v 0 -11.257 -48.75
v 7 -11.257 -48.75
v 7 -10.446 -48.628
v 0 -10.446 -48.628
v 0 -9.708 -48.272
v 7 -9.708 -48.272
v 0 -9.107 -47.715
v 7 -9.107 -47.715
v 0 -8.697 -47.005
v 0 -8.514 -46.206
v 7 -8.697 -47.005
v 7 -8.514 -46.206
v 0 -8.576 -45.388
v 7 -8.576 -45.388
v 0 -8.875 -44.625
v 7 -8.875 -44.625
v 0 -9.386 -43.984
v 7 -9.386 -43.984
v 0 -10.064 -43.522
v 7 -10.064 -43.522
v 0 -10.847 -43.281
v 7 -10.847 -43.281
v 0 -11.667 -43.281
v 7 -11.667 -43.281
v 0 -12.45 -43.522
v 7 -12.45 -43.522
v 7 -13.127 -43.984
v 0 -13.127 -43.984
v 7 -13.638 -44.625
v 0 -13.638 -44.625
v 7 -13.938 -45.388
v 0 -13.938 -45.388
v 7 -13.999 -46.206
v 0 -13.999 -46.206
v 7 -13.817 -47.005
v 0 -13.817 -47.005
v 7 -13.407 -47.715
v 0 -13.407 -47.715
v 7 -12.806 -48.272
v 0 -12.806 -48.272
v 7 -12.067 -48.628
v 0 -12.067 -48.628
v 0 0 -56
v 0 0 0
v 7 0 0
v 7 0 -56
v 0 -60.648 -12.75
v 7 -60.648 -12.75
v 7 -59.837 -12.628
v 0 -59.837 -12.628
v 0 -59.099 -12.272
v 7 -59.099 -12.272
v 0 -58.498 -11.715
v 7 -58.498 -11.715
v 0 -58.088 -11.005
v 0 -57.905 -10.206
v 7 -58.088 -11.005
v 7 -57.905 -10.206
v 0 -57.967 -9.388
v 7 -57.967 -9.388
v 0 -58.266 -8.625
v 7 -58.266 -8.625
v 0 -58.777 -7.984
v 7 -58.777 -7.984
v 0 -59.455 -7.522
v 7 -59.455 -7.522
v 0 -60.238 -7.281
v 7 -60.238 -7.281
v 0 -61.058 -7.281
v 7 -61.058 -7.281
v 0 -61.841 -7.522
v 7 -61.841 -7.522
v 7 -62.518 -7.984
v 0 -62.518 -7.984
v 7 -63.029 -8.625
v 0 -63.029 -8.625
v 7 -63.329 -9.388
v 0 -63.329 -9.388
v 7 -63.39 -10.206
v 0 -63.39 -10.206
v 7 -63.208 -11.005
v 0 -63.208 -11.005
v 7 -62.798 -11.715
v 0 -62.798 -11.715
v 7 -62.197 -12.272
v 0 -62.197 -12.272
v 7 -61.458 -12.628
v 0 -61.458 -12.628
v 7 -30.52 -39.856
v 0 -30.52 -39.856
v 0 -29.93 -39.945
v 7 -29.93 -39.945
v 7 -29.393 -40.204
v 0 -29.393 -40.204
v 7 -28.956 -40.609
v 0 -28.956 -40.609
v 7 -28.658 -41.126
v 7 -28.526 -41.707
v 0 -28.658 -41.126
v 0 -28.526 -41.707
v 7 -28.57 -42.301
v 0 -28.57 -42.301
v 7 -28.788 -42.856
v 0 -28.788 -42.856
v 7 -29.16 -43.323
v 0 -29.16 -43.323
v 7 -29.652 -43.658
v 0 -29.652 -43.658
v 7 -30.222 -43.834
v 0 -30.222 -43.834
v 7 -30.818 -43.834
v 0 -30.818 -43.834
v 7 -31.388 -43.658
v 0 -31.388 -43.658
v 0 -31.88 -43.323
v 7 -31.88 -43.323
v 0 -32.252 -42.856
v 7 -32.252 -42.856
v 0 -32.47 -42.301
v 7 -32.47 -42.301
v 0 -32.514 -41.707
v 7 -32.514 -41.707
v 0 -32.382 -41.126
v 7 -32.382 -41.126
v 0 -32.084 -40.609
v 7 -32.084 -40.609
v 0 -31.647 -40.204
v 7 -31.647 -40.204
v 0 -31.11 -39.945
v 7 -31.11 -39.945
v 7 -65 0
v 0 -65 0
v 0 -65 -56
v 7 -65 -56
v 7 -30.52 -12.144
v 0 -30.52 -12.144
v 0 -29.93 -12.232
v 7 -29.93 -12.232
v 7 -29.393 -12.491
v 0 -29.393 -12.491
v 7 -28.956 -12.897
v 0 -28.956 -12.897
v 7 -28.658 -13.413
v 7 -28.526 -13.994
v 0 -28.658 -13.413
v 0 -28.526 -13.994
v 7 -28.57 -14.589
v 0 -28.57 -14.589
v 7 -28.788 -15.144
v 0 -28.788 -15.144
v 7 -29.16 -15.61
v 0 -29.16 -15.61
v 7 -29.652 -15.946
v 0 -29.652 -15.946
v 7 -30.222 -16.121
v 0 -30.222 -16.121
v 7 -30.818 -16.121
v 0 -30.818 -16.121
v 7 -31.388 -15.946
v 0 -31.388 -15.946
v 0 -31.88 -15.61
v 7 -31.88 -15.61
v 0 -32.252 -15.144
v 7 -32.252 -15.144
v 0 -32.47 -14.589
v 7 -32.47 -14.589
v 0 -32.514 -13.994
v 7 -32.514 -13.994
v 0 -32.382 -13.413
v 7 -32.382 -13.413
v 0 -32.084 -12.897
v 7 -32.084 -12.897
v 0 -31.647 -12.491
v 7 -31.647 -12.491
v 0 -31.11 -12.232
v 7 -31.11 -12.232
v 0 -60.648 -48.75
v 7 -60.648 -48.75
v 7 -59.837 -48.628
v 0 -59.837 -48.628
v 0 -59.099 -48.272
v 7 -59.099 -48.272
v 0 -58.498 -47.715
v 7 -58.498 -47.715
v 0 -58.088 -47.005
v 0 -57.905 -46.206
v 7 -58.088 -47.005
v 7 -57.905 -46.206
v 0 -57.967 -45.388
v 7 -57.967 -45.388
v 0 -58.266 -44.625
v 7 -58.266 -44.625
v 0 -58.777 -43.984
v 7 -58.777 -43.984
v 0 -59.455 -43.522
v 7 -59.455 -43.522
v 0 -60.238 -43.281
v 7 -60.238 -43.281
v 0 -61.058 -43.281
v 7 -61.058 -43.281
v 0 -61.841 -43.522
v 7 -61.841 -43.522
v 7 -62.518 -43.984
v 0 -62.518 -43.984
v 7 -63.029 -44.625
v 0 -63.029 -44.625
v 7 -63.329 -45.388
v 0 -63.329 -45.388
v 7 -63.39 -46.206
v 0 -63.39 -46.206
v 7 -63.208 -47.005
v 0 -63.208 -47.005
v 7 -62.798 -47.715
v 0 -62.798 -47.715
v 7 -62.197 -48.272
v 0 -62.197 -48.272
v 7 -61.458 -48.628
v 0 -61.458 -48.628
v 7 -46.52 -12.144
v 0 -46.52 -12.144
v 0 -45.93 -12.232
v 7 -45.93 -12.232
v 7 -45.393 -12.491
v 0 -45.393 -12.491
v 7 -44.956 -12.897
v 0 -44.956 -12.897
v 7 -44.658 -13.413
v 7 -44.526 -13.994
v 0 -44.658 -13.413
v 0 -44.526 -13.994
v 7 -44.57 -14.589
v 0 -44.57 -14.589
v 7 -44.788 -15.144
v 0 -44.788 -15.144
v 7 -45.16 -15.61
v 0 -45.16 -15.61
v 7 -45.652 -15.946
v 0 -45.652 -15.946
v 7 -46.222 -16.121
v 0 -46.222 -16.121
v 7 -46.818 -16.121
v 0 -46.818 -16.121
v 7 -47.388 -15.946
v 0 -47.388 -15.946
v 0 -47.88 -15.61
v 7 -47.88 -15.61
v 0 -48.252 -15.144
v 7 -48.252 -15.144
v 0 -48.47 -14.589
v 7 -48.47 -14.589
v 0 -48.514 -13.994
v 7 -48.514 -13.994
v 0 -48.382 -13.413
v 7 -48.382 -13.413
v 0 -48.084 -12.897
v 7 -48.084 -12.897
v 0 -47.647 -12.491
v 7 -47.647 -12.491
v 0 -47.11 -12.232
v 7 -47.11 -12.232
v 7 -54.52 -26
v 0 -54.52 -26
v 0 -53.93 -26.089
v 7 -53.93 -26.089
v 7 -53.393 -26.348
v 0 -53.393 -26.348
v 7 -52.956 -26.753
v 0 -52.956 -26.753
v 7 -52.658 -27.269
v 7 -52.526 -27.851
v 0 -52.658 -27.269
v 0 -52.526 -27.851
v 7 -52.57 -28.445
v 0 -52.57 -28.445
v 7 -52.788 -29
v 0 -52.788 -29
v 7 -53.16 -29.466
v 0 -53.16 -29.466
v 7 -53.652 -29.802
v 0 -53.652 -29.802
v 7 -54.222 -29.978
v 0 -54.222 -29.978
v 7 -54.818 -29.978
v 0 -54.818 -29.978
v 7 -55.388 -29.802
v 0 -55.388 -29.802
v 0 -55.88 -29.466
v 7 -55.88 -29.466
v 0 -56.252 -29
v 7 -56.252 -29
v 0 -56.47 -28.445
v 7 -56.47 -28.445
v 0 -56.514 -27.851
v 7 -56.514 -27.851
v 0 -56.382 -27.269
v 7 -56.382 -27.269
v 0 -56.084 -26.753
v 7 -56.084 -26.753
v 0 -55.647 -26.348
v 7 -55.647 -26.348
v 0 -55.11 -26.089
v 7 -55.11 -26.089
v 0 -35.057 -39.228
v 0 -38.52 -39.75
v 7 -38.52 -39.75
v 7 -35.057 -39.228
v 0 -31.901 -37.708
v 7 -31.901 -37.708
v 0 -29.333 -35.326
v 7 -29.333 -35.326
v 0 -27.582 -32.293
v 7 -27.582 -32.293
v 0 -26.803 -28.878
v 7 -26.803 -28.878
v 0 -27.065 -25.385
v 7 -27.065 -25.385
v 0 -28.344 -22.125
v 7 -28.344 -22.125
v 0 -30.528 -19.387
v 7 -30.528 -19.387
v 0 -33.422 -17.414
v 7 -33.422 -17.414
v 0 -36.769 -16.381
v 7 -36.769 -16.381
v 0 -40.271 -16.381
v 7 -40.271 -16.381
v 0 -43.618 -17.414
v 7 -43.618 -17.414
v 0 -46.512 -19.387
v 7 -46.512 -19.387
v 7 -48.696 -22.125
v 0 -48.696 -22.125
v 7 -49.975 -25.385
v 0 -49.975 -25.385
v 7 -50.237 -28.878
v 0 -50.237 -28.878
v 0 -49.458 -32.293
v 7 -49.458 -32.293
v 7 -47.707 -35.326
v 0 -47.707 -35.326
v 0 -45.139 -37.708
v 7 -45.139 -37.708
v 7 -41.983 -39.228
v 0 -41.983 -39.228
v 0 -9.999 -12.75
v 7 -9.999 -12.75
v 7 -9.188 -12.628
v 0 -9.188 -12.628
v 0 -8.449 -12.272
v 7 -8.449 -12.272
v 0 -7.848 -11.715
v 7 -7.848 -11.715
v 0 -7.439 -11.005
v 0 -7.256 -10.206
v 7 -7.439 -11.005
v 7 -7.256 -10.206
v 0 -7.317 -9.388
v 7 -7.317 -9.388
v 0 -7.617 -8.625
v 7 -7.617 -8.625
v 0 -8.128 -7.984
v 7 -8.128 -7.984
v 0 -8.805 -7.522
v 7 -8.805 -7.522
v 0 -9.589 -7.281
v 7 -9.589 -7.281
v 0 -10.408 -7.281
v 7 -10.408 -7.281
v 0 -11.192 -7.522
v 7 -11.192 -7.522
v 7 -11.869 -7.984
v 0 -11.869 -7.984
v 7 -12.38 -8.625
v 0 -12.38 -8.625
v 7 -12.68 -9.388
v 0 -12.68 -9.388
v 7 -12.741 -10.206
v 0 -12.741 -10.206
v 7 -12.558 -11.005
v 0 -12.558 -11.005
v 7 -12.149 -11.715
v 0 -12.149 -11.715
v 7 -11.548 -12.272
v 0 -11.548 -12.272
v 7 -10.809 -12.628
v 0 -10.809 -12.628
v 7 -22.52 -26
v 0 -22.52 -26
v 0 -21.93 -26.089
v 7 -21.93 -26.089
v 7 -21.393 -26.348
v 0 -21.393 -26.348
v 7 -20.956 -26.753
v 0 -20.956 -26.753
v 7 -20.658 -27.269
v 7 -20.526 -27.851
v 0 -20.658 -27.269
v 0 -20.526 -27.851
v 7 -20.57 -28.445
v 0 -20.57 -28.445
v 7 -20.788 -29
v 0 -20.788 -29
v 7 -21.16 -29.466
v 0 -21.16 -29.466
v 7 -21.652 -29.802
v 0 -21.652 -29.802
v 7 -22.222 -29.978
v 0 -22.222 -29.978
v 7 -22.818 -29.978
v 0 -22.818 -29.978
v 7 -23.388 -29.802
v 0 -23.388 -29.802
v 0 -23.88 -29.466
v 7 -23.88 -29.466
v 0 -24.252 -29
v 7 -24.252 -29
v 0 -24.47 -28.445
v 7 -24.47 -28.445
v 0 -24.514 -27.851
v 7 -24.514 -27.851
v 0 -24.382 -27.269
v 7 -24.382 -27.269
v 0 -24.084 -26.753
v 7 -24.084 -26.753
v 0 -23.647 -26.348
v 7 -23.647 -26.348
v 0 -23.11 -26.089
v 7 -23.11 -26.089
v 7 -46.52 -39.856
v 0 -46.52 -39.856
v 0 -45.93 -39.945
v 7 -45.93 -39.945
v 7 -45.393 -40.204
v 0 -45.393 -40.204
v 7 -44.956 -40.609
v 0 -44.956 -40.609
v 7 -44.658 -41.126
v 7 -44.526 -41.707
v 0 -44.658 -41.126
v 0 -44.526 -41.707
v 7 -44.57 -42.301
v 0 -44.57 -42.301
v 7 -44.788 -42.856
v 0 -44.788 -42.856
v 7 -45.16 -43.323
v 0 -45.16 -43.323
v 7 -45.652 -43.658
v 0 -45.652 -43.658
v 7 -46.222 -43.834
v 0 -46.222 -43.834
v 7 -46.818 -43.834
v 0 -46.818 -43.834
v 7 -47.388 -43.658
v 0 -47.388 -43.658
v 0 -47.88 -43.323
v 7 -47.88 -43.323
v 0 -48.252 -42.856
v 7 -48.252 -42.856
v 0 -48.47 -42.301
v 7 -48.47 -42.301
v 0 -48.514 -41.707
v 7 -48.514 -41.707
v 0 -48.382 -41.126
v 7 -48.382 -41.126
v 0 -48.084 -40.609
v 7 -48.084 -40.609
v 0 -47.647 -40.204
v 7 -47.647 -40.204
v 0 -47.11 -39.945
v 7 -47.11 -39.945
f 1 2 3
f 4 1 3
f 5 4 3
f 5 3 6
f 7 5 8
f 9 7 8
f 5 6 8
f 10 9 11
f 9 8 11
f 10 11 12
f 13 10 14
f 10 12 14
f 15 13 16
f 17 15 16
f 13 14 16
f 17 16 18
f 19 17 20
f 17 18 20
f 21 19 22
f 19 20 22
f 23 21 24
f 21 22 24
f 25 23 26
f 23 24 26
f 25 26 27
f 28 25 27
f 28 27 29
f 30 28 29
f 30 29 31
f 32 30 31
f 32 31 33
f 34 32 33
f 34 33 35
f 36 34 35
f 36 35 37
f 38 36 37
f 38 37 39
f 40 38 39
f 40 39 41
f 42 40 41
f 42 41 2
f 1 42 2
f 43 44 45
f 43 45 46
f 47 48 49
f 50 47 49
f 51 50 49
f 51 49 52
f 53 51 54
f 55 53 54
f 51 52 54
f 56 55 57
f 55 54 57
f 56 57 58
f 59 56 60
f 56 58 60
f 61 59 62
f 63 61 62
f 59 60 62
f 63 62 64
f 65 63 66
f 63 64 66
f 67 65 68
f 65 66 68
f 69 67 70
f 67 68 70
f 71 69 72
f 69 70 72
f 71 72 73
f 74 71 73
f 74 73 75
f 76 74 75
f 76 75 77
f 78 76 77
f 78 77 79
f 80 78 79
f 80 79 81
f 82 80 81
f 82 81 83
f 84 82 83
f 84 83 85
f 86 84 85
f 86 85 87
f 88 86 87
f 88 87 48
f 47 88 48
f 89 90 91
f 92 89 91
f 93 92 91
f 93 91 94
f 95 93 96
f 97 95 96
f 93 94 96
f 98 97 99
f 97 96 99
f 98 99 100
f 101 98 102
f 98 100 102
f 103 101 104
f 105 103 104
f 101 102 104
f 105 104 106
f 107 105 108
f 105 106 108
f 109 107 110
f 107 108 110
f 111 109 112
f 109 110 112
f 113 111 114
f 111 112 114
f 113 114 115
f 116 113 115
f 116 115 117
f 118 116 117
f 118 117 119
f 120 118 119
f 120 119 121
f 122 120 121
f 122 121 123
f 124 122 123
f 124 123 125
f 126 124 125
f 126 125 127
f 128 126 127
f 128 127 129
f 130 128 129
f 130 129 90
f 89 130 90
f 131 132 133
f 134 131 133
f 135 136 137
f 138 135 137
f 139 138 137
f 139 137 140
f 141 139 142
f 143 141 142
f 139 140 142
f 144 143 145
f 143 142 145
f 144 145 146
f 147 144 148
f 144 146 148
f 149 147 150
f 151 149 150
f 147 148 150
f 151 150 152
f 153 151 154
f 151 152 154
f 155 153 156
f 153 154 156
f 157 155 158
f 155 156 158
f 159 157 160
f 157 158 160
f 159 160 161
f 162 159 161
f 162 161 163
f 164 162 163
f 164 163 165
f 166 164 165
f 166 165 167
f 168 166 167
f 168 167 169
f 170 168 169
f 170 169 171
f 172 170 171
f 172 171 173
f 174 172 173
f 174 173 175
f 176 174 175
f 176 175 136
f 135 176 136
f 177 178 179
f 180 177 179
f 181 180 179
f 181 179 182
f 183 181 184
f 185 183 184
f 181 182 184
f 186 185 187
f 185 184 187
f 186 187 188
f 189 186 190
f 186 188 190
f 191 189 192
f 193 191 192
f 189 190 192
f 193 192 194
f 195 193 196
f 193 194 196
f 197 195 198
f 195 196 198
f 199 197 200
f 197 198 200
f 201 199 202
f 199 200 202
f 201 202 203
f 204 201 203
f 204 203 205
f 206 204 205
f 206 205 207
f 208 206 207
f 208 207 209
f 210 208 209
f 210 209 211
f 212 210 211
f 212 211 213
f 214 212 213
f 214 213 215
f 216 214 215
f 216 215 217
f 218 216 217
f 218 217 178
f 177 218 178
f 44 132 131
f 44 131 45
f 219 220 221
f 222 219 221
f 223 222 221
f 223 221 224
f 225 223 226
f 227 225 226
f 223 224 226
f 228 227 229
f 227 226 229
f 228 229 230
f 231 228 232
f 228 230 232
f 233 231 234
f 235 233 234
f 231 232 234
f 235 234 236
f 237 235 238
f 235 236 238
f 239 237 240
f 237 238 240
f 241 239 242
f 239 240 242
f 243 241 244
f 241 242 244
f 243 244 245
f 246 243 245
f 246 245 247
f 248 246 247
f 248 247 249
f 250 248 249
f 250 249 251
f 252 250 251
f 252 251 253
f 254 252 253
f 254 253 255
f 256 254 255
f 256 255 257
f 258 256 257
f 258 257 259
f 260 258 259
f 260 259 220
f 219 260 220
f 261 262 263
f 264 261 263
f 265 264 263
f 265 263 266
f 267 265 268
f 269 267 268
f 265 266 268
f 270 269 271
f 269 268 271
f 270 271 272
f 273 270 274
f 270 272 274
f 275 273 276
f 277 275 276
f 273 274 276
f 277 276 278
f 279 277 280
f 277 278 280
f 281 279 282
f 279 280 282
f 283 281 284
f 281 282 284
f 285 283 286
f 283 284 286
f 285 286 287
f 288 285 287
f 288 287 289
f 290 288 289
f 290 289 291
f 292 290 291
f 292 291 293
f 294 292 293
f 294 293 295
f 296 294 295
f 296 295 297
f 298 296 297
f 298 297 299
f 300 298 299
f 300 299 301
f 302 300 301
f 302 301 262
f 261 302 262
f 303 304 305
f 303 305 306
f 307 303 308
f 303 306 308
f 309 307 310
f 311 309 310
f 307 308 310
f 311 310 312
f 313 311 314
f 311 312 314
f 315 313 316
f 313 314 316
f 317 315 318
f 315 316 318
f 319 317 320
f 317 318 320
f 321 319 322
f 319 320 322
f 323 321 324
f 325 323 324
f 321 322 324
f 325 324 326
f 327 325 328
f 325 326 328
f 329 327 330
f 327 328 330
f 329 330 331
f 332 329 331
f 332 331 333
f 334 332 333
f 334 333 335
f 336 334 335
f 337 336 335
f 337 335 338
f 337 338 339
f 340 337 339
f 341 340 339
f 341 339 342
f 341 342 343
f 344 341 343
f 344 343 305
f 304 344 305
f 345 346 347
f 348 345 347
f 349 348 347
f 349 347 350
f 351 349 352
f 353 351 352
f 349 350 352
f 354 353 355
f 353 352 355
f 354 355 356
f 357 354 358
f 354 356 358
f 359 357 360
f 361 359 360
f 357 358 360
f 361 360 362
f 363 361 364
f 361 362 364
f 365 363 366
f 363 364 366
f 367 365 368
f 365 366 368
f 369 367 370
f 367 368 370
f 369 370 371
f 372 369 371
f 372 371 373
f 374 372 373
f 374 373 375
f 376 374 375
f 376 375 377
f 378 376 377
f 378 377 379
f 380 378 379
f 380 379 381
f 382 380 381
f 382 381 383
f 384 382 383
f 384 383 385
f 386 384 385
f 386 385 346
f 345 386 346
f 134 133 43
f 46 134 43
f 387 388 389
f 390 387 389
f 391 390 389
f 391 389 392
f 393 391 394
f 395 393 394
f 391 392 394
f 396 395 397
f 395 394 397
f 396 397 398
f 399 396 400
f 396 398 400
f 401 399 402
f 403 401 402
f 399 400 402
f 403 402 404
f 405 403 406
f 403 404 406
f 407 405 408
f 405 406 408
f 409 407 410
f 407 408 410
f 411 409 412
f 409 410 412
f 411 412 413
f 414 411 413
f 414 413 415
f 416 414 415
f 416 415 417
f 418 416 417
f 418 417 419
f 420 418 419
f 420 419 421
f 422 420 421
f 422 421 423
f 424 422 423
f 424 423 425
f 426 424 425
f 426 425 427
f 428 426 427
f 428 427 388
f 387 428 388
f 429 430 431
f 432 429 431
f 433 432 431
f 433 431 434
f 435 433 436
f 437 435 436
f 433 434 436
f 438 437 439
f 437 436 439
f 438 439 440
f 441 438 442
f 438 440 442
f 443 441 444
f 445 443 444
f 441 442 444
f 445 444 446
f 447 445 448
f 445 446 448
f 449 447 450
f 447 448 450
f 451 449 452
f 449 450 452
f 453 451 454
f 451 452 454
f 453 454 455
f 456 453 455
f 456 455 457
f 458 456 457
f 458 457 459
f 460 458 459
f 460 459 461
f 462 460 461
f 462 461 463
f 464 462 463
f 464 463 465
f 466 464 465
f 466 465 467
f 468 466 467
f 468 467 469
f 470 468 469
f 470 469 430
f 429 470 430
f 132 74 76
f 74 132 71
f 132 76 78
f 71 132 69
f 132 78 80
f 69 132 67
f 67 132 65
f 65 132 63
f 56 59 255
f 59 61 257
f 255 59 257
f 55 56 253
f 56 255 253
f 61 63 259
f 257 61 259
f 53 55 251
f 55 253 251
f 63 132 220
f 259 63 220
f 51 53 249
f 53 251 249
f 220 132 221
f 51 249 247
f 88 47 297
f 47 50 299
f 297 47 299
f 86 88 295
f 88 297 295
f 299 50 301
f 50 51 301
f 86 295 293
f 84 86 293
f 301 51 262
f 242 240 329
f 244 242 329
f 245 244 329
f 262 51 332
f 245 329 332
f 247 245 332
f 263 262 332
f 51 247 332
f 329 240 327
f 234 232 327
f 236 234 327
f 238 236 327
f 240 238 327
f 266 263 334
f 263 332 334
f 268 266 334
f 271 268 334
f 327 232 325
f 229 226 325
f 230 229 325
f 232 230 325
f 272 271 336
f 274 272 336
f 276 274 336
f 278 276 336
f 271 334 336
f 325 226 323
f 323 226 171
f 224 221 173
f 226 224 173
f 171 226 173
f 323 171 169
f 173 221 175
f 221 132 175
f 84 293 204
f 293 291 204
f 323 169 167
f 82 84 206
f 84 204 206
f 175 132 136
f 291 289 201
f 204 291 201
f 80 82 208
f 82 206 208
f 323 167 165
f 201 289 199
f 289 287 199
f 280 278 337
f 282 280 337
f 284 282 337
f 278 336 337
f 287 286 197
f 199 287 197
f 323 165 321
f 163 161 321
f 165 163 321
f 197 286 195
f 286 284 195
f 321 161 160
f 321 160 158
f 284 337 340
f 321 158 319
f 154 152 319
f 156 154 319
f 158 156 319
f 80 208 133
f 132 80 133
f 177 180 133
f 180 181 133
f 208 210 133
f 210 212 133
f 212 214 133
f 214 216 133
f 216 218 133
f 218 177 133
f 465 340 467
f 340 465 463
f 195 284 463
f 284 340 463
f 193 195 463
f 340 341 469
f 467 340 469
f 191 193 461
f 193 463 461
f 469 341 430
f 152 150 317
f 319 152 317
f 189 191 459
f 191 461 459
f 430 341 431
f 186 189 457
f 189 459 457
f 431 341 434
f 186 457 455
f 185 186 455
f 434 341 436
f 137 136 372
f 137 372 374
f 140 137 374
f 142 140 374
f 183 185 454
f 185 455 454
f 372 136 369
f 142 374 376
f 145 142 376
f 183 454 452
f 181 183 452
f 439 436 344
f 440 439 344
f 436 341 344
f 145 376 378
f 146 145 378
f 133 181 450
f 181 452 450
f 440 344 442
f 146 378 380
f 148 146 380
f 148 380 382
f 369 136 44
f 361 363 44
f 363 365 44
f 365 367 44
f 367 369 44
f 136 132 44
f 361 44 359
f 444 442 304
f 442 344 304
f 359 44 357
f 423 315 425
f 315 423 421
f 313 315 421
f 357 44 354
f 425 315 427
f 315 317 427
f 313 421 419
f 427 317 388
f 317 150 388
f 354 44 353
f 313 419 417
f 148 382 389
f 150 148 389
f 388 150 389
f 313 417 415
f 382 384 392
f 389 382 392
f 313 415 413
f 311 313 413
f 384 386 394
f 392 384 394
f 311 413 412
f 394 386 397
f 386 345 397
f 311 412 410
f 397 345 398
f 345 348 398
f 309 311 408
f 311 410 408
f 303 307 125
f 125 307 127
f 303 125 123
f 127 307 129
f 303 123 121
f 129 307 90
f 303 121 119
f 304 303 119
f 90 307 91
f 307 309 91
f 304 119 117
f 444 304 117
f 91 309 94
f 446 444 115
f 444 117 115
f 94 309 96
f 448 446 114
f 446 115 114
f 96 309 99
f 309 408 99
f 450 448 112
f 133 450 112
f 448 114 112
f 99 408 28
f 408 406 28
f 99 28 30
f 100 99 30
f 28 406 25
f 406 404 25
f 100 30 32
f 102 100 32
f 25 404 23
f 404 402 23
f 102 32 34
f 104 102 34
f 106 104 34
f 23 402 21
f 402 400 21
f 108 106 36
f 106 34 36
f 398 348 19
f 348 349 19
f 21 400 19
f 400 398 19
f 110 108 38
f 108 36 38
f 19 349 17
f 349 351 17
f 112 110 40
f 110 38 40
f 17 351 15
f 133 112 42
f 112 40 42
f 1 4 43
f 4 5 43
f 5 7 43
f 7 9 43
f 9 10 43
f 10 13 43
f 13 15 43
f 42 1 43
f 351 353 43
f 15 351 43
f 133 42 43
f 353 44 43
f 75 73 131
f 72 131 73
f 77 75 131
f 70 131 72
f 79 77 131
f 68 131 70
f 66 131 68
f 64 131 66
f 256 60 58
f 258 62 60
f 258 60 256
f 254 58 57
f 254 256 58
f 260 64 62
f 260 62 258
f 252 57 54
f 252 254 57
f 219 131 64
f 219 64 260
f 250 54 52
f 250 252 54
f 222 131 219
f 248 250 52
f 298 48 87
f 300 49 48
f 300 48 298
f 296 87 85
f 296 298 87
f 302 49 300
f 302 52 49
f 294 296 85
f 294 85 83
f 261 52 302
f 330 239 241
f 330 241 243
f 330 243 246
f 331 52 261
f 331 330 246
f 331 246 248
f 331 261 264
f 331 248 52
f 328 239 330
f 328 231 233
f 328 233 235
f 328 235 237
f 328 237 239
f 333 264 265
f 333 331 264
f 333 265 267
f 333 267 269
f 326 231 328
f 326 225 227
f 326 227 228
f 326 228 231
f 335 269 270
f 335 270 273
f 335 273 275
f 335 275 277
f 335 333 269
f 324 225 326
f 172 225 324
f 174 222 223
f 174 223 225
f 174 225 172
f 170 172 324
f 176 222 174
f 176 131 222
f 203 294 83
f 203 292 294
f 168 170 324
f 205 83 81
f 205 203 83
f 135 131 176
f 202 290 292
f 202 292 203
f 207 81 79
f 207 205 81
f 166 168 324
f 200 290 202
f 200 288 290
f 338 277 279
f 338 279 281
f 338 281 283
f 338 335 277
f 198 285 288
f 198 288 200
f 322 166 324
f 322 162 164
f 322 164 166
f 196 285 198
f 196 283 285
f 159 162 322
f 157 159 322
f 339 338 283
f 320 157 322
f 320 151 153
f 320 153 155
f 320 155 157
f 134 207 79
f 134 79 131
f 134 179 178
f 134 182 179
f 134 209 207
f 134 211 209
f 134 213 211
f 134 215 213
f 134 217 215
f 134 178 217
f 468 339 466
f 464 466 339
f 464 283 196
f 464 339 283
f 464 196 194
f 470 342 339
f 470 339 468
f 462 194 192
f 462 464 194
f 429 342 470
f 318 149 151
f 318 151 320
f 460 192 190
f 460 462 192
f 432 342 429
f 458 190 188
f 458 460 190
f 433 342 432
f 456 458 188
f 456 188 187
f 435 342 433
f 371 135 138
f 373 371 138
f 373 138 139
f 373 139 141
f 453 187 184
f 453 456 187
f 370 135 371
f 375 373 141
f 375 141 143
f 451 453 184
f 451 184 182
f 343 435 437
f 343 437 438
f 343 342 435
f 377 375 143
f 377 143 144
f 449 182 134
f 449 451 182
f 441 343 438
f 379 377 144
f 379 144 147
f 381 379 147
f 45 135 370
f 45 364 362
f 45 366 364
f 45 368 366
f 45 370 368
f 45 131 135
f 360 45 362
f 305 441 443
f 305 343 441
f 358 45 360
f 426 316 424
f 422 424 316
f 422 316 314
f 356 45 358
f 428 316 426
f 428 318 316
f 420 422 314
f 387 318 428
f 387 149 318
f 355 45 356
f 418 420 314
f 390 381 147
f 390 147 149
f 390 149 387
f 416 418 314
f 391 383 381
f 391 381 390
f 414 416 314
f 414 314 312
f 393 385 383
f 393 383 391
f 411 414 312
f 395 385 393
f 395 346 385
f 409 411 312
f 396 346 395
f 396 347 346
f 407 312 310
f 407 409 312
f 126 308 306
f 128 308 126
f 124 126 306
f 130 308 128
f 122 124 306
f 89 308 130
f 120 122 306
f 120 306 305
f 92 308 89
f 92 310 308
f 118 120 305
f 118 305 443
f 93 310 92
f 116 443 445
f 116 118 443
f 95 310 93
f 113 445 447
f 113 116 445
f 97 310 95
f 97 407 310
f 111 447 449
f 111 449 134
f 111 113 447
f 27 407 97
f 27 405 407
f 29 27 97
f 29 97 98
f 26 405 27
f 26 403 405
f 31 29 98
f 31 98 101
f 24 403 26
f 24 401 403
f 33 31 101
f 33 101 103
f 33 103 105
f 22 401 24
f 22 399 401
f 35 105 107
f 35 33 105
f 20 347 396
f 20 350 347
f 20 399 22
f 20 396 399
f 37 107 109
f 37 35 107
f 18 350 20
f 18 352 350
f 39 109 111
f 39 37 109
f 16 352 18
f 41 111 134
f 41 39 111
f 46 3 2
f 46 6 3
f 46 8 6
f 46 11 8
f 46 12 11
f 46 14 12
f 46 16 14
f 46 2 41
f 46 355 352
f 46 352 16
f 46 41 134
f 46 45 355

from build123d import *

# Parameters (mm, degrees)
SKETCH1_W           = 56
SKETCH1_H           = 65
BOSS_EXTRUDE1_DEPTH = 7
SKETCH2_R           = 11.75
CUT_EXTRUDE1_DEPTH  = 8
SKETCH3_R           = 2
CUT_EXTRUDE2_DEPTH  = 8
SKETCH4_R           = 2.75
CUT_EXTRUDE3_DEPTH  = 8


with BuildPart() as part:
    # Sketch1 → Boss-Extrude1 (new body)
    with BuildSketch(Plane(origin=(0, 0, 0), x_dir=(0, 0, -1), z_dir=(1, 0, 0))):
        with Locations((28, -32.5)):
            Rectangle(SKETCH1_W, SKETCH1_H)
    extrude(amount=BOSS_EXTRUDE1_DEPTH)

    # Sketch2 → Cut-Extrude1 (cut, through all)
    with BuildSketch(Plane(origin=(7, 0, 0), x_dir=(0, 0, -1), z_dir=(1, 0, 0))):
        with Locations((28, -38.52)):
            Circle(SKETCH2_R)
    extrude(amount=-CUT_EXTRUDE1_DEPTH, mode=Mode.SUBTRACT)

    # Sketch3 → Cut-Extrude2 (cut, through all)
    with BuildSketch(Plane.ZY):
        with Locations((-41.856406461, -30.52)):
            Circle(SKETCH3_R)
        with Locations((-28, -22.52)):
            Circle(SKETCH3_R)
        with Locations((-14.143593539, -30.52)):
            Circle(SKETCH3_R)
        with Locations((-14.143593539, -46.52)):
            Circle(SKETCH3_R)
        with Locations((-28, -54.52)):
            Circle(SKETCH3_R)
        with Locations((-41.856406461, -46.52)):
            Circle(SKETCH3_R)
    extrude(amount=-CUT_EXTRUDE2_DEPTH, mode=Mode.SUBTRACT)

    # Sketch4 → Cut-Extrude3 (cut, through all)
    with BuildSketch(Plane(origin=(7, 0, 0), x_dir=(0, 0, -1), z_dir=(1, 0, 0))):
        with Locations((10, -60.647707201)):
            Circle(SKETCH4_R)
        with Locations((10, -9.998526597)):
            Circle(SKETCH4_R)
        with Locations((46, -11.256698369)):
            Circle(SKETCH4_R)
        with Locations((46, -60.647707201)):
            Circle(SKETCH4_R)
    extrude(amount=-CUT_EXTRUDE3_DEPTH, mode=Mode.SUBTRACT)


solid = part.part
